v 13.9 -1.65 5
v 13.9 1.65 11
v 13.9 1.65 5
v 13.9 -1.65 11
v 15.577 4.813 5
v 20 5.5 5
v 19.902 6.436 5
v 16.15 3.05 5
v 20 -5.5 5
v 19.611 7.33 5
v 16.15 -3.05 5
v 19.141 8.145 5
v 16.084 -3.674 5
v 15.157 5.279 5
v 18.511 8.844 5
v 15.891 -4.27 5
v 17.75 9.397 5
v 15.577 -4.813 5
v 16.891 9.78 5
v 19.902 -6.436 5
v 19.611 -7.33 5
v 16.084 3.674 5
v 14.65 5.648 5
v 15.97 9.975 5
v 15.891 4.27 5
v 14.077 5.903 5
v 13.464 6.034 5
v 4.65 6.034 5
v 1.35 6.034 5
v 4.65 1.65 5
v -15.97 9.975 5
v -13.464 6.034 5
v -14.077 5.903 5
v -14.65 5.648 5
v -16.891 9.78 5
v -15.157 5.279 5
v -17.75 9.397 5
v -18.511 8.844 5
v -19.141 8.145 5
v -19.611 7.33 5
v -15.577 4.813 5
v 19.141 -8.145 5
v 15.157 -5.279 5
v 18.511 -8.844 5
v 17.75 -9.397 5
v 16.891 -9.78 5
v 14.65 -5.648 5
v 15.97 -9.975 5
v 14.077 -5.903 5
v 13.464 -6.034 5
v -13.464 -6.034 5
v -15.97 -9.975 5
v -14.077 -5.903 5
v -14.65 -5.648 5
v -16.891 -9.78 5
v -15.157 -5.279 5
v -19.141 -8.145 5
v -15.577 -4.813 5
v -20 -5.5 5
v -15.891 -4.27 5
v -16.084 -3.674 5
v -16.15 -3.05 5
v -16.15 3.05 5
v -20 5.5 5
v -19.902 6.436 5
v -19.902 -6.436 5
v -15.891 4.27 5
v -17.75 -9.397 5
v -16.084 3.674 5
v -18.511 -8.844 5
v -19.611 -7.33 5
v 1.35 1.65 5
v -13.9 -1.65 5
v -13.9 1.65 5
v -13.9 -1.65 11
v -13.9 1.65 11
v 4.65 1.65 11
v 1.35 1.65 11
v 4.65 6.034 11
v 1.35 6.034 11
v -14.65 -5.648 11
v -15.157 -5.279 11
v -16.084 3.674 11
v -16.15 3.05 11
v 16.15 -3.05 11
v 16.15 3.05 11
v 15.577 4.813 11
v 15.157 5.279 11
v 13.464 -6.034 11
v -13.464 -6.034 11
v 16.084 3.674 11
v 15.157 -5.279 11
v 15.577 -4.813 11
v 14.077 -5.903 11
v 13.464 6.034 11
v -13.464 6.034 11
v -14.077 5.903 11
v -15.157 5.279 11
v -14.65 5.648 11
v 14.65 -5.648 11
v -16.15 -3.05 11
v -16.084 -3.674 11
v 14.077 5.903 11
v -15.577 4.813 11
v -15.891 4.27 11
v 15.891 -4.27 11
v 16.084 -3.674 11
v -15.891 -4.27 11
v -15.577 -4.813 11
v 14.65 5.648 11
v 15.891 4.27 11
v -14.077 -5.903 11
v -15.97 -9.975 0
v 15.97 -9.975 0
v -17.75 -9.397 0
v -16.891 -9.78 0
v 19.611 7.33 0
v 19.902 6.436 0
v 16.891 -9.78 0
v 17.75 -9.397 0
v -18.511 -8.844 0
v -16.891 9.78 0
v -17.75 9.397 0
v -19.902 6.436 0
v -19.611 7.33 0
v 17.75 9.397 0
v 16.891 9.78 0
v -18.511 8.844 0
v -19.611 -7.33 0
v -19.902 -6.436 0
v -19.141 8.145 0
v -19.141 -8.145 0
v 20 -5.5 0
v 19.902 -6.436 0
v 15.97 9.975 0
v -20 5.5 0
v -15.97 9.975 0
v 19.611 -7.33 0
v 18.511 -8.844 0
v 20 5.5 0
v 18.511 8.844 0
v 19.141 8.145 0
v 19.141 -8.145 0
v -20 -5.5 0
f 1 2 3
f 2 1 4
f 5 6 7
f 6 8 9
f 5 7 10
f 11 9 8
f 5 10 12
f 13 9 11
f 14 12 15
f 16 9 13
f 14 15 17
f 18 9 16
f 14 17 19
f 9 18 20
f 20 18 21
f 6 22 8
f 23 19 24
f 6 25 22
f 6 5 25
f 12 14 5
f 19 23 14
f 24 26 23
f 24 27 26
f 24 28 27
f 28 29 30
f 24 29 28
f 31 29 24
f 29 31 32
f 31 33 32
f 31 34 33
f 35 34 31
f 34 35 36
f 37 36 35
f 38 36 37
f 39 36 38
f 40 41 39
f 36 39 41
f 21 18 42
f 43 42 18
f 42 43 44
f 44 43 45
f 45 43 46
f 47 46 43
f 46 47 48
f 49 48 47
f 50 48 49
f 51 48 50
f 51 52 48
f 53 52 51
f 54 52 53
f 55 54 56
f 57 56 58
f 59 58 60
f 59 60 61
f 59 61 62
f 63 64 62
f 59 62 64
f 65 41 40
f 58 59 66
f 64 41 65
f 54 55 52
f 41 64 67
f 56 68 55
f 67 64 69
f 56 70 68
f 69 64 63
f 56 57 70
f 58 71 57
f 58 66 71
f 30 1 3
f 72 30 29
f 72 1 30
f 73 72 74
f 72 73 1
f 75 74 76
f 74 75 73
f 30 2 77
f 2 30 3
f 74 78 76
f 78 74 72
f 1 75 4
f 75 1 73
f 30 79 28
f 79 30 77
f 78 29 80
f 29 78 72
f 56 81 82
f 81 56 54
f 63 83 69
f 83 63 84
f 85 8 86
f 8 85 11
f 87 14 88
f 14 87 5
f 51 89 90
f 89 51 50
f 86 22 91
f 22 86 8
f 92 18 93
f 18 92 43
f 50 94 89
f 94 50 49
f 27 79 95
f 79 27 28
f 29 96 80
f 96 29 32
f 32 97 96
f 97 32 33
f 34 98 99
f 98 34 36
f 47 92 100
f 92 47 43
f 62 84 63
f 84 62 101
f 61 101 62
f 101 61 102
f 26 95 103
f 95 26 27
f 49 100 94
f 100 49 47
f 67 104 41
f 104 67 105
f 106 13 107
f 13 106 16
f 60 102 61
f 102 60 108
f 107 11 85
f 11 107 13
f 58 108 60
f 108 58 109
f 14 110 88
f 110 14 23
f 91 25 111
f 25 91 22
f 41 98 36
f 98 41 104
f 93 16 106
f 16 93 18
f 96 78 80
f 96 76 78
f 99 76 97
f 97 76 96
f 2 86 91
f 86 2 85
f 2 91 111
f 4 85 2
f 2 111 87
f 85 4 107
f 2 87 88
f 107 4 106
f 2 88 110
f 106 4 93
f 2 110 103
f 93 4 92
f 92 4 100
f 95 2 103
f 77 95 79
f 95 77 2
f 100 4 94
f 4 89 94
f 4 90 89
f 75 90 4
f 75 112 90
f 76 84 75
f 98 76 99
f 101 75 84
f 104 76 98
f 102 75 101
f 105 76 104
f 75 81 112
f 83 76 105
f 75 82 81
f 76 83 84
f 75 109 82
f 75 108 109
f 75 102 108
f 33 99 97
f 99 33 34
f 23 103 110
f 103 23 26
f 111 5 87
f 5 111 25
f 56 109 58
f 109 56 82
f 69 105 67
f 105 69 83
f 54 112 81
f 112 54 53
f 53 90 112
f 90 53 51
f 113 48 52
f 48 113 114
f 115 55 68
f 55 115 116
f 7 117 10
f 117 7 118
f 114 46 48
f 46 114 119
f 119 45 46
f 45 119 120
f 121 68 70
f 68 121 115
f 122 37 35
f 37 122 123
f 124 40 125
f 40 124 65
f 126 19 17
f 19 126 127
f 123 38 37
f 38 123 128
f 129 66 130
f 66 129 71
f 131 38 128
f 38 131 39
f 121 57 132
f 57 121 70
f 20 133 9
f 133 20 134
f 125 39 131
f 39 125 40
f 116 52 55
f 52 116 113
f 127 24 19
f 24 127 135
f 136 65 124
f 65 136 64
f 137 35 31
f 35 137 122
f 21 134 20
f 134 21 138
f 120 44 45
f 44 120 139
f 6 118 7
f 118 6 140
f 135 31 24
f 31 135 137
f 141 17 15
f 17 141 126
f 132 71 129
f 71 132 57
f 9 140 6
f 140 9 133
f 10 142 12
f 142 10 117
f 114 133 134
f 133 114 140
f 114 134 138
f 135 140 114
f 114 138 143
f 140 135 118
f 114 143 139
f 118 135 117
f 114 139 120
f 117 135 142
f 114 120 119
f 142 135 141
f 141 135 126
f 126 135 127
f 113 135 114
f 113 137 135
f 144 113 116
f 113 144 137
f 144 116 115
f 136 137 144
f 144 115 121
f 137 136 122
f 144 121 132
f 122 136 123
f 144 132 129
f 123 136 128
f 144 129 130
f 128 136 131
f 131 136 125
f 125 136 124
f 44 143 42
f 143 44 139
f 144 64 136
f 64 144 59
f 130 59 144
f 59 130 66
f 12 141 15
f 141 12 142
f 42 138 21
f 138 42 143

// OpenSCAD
//-- two rounded flat cubes with a slot in the middle
//-- rear feet have an extra slot at right angle
//-- also left foot is mirror of right foot

x1=40;

y1=20;

th=5;
  
//-- OK, now we define the cylinders that are going to be at
//-- the four corners of our rounded corners box.

//-- the radius of the cylinders
box_corner_radius=4.5;

//-- The centers of the four corner cylinders

P1=[x1/2-box_corner_radius,y1/2-box_corner_radius,0];
P2=[x1/2-box_corner_radius,-y1/2+box_corner_radius,0];
P3=[-x1/2+box_corner_radius,-y1/2+box_corner_radius,0];
P4=[-x1/2+box_corner_radius,y1/2-box_corner_radius,0];

translate([0,0,th/2]) {
  hull() {
    translate(P1)
      cylinder(r=box_corner_radius,h=th,$fn=30,center=true);
      
    translate(P2)
      cylinder(r=box_corner_radius,h=th,$fn=30,center=true);
      
    translate(P3)
      cylinder(r=box_corner_radius,h=th,$fn=30,center=true);
      
    translate(P4)
      cylinder(r=box_corner_radius,h=th,$fn=30,center=true);
  }
}

//-- OK, now we define the cylinders that are going to be at
//-- the four corners of our 2nd rounded corners box.
x2=35.3;

y2=15.1;

th2=6;
//-- the radius of the cylinders
bc2=3;

//-- slot size
x3=27.8;
y3=3.3;
th3=th2+1;

//-- 2nd slot size


//-- The centers of the four corner cylinders

PT1=[x2/2-box_corner_radius,y2/2-box_corner_radius,0];
PT2=[x2/2-box_corner_radius,-y2/2+box_corner_radius,0];
PT3=[-x2/2+box_corner_radius,-y2/2+box_corner_radius,0];
PT4=[-x2/2+box_corner_radius,y2/2-box_corner_radius,0];

// -- uncoment to next lilne for the mirrored part
//mirror([1,0,0]) 
difference() {
  translate([0,0,th+th2/2]) {
    hull() {
      translate(PT1)
	cylinder(r=bc2,h=th2,$fn=30,center=true);
	
      translate(PT2)
	cylinder(r=bc2,h=th2,$fn=30,center=true);
	
      translate(PT3)
	cylinder(r=bc2,h=th2,$fn=30,center=true);
	
      translate(PT4)
	cylinder(r=bc2,h=th2,$fn=30,center=true);
    }
  }

  //-- Now we define the main T which we are going to hollow out

  union() {
    translate([0,0,th+th3/2])
      cube([x3,y3,th3],center=true);
    translate([3,x3/2,th+th3/2])
      cube([y3,x3,th3],center=true);
  }
}
